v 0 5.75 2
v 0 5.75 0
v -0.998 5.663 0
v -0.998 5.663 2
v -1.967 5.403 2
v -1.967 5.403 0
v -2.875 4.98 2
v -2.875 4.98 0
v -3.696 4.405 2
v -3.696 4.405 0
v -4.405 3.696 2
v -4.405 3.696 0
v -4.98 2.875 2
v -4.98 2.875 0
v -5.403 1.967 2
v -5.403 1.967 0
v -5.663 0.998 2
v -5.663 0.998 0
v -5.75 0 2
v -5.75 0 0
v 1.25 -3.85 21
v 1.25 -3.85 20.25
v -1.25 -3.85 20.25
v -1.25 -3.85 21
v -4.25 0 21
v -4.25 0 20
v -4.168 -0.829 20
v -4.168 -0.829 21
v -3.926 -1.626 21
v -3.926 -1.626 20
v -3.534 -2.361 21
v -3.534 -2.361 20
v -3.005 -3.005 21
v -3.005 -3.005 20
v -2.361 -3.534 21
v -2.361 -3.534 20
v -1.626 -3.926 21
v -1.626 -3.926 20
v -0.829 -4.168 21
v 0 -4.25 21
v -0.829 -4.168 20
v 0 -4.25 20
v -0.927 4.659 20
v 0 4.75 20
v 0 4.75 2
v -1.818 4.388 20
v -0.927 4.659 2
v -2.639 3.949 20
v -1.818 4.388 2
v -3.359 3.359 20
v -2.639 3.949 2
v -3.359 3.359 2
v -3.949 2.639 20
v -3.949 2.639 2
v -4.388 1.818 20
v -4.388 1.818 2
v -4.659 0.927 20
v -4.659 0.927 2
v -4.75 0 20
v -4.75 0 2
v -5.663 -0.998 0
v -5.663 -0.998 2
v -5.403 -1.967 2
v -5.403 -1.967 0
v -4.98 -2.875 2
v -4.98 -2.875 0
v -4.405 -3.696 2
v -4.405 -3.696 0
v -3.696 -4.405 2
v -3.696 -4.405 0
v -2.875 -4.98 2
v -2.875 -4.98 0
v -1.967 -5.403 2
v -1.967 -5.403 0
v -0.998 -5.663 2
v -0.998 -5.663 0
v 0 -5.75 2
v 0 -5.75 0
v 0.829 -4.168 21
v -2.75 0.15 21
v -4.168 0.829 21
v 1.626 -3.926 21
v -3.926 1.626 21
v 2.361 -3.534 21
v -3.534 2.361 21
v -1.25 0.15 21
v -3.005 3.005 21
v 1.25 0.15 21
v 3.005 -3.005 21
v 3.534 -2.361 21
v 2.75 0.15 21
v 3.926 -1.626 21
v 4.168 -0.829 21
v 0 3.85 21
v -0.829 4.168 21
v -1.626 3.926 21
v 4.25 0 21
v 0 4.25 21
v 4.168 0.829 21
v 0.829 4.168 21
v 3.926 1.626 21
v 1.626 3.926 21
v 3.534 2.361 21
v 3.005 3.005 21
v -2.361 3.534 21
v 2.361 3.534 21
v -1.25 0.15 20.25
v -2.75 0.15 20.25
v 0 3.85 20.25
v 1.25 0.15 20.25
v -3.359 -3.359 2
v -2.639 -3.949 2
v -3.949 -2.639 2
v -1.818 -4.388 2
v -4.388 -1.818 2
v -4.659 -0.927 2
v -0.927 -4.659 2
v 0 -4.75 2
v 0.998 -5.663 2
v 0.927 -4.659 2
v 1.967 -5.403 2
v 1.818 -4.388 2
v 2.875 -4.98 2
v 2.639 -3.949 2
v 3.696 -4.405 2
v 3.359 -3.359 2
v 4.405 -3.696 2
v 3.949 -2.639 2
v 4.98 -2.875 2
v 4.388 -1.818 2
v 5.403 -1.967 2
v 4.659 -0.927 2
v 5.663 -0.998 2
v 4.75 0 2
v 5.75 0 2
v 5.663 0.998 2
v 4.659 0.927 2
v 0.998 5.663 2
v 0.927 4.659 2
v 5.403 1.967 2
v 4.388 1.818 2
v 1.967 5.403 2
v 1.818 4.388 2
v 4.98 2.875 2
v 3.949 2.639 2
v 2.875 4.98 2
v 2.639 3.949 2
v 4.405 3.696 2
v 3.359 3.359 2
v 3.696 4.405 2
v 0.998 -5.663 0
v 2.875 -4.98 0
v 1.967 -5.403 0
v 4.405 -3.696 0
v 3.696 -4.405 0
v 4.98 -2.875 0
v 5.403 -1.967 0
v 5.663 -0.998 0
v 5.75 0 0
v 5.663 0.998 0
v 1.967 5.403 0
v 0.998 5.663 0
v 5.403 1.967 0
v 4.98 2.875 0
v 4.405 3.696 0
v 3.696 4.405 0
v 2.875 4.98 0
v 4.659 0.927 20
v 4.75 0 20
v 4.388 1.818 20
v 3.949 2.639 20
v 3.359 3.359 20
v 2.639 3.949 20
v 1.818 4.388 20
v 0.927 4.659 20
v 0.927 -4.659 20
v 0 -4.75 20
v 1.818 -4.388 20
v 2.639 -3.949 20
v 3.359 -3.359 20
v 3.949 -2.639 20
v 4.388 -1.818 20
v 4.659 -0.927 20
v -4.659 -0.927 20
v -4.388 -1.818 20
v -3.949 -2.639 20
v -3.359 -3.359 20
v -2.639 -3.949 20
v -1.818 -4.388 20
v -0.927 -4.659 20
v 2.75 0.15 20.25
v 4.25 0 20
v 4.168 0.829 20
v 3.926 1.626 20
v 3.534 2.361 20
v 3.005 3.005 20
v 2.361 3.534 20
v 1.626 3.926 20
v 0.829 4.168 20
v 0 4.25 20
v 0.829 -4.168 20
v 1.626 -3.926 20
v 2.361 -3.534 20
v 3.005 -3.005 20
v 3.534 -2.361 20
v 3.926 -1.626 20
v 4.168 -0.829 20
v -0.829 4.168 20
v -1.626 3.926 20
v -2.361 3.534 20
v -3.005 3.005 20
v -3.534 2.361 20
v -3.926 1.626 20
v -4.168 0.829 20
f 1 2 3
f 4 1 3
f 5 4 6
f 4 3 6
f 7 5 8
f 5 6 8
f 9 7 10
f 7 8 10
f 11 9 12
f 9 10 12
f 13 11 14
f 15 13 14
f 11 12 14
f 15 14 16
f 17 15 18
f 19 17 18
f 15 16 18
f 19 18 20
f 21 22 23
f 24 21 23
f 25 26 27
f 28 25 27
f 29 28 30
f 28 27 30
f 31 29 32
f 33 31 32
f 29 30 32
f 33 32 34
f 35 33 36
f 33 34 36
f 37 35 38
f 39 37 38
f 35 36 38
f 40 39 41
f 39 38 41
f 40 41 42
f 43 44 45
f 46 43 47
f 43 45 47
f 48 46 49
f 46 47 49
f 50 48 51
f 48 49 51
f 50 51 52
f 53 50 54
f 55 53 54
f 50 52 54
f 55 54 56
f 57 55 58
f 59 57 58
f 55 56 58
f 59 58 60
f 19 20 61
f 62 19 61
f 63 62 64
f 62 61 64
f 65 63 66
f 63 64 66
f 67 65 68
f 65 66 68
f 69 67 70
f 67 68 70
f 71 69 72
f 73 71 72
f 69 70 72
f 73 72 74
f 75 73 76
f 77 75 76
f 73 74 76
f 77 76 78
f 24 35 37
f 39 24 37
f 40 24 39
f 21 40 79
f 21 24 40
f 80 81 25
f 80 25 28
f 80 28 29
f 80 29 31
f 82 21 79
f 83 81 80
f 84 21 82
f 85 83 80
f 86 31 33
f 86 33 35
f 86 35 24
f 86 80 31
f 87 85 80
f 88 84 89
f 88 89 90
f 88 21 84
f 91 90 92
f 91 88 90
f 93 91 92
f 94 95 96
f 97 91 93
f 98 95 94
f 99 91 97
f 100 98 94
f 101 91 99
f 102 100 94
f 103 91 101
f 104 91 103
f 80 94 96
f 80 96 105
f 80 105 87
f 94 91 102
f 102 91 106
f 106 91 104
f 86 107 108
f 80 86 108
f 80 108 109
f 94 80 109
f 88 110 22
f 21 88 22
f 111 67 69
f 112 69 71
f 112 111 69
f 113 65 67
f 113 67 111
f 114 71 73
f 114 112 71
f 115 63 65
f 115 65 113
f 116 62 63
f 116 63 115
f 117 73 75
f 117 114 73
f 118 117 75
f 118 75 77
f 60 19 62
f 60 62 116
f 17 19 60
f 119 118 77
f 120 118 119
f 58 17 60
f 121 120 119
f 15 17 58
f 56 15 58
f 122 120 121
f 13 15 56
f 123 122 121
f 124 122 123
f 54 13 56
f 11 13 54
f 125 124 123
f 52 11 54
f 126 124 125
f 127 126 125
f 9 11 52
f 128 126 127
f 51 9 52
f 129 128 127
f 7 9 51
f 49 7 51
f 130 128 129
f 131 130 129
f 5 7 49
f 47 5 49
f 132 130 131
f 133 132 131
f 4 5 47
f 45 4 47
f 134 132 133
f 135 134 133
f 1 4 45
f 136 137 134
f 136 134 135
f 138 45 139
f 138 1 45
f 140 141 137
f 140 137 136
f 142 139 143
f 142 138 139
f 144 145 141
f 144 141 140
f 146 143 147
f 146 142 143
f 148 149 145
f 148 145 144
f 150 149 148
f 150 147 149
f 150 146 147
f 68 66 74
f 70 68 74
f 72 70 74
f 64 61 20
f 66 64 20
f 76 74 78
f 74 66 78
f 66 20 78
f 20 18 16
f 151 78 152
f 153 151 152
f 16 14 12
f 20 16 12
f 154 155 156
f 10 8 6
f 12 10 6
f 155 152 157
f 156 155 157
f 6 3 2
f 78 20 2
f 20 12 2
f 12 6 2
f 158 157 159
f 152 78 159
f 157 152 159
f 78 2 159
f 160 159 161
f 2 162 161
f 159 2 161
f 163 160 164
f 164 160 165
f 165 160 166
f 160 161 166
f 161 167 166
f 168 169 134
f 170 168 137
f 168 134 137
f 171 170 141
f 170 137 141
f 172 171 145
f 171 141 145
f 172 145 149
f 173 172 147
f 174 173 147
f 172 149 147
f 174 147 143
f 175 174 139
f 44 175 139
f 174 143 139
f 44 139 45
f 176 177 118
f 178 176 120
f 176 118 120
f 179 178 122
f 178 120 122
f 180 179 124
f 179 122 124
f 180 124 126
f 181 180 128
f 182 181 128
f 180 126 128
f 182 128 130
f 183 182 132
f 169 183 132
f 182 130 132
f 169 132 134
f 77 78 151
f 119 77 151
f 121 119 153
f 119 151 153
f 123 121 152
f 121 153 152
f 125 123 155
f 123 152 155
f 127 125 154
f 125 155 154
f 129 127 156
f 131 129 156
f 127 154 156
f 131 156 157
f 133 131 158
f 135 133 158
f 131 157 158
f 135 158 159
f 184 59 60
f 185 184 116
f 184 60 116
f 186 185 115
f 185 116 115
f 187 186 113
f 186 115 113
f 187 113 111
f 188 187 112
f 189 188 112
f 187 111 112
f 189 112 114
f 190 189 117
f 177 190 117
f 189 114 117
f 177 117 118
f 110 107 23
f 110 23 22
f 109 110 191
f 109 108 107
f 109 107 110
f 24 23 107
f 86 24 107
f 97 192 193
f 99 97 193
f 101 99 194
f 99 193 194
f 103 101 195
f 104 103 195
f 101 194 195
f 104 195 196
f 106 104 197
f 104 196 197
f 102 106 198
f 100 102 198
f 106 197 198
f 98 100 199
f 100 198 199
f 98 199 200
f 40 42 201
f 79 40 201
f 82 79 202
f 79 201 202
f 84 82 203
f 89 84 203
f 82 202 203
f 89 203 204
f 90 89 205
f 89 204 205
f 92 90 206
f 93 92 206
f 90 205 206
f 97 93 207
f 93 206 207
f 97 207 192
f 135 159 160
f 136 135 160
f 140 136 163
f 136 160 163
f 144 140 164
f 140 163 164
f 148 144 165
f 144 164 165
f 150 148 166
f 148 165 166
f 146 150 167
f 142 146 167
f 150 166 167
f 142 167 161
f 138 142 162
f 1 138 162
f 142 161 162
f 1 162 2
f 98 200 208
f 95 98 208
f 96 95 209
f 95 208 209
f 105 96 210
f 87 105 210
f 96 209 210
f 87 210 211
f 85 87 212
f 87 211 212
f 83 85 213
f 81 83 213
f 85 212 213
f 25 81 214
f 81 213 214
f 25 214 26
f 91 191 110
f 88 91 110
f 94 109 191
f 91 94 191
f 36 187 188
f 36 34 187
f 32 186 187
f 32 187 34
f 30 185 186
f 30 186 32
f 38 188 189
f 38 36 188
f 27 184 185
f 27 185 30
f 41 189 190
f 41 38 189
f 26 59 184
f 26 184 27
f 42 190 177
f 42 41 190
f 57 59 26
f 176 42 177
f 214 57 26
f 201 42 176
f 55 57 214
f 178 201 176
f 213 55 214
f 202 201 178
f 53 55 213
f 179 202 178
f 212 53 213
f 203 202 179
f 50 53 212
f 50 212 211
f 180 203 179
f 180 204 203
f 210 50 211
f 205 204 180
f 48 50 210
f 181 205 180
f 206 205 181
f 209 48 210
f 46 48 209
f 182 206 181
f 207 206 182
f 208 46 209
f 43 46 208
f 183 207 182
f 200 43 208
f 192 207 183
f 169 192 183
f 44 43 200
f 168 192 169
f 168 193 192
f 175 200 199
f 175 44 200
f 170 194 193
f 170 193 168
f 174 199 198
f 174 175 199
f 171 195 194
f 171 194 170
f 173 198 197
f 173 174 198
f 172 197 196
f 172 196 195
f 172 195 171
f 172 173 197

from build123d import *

# Parameters (mm, degrees)
F1_DEPTH = 21
F2_DEPTH = 20
F3_DEPTH = 2
F4_DEPTH = 20.25


with BuildPart() as f1:
    # F0 (on Top) → F1 (new body)
    with BuildSketch(Plane.XY):
        with BuildLine():
            ThreePointArc((0, 4.25), (-3.005204, 3.005204), (-4.25, 0))
            ThreePointArc((-4.25, 0), (-3.005204, -3.005204), (0, -4.25))
            ThreePointArc((0, -4.25), (3.005204, -3.005204), (4.25, 0))
            ThreePointArc((4.25, 0), (3.005204, 3.005204), (0, 4.25))
        make_face()
        Polygon((1.25, -3.85), (-1.25, -3.85), (-1.25, 0.15), (-2.75, 0.15), (0, 3.85), (2.75, 0.15), (1.25, 0.15), align=None, mode=Mode.SUBTRACT)
    extrude(amount=F1_DEPTH)

    # F0 (on Top) → F2 (join)
    with BuildSketch(Plane.XY):
        with BuildLine():
            ThreePointArc((4.75, 0), (3.358757, 3.358757), (0, 4.75))
            ThreePointArc((0, 4.75), (-3.358757, 3.358757), (-4.75, 0))
            ThreePointArc((-4.75, 0), (-3.358757, -3.358757), (0, -4.75))
            ThreePointArc((0, -4.75), (3.358757, -3.358757), (4.75, 0))
        make_face()
        with BuildLine():
            ThreePointArc((0, -4.25), (-3.005204, -3.005204), (-4.25, 0))
            ThreePointArc((-4.25, 0), (-3.005204, 3.005204), (0, 4.25))
            ThreePointArc((0, 4.25), (3.005204, 3.005204), (4.25, 0))
            ThreePointArc((4.25, 0), (3.005204, -3.005204), (0, -4.25))
        make_face(mode=Mode.SUBTRACT)
    extrude(amount=F2_DEPTH)

    # F0 (on Top) → F3 (join)
    with BuildSketch(Plane.XY):
        with BuildLine():
            ThreePointArc((-5.75, 0), (-4.065864, -4.065864), (0, -5.75))
            ThreePointArc((0, -5.75), (4.065864, -4.065864), (5.75, 0))
            ThreePointArc((5.75, 0), (4.065864, 4.065864), (0, 5.75))
            ThreePointArc((0, 5.75), (-4.065864, 4.065864), (-5.75, 0))
        make_face()
        with BuildLine():
            ThreePointArc((-4.75, 0), (-3.358757, 3.358757), (0, 4.75))
            ThreePointArc((0, 4.75), (3.358757, 3.358757), (4.75, 0))
            ThreePointArc((4.75, 0), (3.358757, -3.358757), (0, -4.75))
            ThreePointArc((0, -4.75), (-3.358757, -3.358757), (-4.75, 0))
        make_face(mode=Mode.SUBTRACT)
    extrude(amount=F3_DEPTH)

    # F0 (on Top) → F4 (join)
    with BuildSketch(Plane.XY):
        Polygon((-1.25, 0.15), (-1.25, -3.85), (1.25, -3.85), (1.25, 0.15), (2.75, 0.15), (0, 3.85), (-2.75, 0.15), align=None)
    extrude(amount=F4_DEPTH)


solid = f1.part
